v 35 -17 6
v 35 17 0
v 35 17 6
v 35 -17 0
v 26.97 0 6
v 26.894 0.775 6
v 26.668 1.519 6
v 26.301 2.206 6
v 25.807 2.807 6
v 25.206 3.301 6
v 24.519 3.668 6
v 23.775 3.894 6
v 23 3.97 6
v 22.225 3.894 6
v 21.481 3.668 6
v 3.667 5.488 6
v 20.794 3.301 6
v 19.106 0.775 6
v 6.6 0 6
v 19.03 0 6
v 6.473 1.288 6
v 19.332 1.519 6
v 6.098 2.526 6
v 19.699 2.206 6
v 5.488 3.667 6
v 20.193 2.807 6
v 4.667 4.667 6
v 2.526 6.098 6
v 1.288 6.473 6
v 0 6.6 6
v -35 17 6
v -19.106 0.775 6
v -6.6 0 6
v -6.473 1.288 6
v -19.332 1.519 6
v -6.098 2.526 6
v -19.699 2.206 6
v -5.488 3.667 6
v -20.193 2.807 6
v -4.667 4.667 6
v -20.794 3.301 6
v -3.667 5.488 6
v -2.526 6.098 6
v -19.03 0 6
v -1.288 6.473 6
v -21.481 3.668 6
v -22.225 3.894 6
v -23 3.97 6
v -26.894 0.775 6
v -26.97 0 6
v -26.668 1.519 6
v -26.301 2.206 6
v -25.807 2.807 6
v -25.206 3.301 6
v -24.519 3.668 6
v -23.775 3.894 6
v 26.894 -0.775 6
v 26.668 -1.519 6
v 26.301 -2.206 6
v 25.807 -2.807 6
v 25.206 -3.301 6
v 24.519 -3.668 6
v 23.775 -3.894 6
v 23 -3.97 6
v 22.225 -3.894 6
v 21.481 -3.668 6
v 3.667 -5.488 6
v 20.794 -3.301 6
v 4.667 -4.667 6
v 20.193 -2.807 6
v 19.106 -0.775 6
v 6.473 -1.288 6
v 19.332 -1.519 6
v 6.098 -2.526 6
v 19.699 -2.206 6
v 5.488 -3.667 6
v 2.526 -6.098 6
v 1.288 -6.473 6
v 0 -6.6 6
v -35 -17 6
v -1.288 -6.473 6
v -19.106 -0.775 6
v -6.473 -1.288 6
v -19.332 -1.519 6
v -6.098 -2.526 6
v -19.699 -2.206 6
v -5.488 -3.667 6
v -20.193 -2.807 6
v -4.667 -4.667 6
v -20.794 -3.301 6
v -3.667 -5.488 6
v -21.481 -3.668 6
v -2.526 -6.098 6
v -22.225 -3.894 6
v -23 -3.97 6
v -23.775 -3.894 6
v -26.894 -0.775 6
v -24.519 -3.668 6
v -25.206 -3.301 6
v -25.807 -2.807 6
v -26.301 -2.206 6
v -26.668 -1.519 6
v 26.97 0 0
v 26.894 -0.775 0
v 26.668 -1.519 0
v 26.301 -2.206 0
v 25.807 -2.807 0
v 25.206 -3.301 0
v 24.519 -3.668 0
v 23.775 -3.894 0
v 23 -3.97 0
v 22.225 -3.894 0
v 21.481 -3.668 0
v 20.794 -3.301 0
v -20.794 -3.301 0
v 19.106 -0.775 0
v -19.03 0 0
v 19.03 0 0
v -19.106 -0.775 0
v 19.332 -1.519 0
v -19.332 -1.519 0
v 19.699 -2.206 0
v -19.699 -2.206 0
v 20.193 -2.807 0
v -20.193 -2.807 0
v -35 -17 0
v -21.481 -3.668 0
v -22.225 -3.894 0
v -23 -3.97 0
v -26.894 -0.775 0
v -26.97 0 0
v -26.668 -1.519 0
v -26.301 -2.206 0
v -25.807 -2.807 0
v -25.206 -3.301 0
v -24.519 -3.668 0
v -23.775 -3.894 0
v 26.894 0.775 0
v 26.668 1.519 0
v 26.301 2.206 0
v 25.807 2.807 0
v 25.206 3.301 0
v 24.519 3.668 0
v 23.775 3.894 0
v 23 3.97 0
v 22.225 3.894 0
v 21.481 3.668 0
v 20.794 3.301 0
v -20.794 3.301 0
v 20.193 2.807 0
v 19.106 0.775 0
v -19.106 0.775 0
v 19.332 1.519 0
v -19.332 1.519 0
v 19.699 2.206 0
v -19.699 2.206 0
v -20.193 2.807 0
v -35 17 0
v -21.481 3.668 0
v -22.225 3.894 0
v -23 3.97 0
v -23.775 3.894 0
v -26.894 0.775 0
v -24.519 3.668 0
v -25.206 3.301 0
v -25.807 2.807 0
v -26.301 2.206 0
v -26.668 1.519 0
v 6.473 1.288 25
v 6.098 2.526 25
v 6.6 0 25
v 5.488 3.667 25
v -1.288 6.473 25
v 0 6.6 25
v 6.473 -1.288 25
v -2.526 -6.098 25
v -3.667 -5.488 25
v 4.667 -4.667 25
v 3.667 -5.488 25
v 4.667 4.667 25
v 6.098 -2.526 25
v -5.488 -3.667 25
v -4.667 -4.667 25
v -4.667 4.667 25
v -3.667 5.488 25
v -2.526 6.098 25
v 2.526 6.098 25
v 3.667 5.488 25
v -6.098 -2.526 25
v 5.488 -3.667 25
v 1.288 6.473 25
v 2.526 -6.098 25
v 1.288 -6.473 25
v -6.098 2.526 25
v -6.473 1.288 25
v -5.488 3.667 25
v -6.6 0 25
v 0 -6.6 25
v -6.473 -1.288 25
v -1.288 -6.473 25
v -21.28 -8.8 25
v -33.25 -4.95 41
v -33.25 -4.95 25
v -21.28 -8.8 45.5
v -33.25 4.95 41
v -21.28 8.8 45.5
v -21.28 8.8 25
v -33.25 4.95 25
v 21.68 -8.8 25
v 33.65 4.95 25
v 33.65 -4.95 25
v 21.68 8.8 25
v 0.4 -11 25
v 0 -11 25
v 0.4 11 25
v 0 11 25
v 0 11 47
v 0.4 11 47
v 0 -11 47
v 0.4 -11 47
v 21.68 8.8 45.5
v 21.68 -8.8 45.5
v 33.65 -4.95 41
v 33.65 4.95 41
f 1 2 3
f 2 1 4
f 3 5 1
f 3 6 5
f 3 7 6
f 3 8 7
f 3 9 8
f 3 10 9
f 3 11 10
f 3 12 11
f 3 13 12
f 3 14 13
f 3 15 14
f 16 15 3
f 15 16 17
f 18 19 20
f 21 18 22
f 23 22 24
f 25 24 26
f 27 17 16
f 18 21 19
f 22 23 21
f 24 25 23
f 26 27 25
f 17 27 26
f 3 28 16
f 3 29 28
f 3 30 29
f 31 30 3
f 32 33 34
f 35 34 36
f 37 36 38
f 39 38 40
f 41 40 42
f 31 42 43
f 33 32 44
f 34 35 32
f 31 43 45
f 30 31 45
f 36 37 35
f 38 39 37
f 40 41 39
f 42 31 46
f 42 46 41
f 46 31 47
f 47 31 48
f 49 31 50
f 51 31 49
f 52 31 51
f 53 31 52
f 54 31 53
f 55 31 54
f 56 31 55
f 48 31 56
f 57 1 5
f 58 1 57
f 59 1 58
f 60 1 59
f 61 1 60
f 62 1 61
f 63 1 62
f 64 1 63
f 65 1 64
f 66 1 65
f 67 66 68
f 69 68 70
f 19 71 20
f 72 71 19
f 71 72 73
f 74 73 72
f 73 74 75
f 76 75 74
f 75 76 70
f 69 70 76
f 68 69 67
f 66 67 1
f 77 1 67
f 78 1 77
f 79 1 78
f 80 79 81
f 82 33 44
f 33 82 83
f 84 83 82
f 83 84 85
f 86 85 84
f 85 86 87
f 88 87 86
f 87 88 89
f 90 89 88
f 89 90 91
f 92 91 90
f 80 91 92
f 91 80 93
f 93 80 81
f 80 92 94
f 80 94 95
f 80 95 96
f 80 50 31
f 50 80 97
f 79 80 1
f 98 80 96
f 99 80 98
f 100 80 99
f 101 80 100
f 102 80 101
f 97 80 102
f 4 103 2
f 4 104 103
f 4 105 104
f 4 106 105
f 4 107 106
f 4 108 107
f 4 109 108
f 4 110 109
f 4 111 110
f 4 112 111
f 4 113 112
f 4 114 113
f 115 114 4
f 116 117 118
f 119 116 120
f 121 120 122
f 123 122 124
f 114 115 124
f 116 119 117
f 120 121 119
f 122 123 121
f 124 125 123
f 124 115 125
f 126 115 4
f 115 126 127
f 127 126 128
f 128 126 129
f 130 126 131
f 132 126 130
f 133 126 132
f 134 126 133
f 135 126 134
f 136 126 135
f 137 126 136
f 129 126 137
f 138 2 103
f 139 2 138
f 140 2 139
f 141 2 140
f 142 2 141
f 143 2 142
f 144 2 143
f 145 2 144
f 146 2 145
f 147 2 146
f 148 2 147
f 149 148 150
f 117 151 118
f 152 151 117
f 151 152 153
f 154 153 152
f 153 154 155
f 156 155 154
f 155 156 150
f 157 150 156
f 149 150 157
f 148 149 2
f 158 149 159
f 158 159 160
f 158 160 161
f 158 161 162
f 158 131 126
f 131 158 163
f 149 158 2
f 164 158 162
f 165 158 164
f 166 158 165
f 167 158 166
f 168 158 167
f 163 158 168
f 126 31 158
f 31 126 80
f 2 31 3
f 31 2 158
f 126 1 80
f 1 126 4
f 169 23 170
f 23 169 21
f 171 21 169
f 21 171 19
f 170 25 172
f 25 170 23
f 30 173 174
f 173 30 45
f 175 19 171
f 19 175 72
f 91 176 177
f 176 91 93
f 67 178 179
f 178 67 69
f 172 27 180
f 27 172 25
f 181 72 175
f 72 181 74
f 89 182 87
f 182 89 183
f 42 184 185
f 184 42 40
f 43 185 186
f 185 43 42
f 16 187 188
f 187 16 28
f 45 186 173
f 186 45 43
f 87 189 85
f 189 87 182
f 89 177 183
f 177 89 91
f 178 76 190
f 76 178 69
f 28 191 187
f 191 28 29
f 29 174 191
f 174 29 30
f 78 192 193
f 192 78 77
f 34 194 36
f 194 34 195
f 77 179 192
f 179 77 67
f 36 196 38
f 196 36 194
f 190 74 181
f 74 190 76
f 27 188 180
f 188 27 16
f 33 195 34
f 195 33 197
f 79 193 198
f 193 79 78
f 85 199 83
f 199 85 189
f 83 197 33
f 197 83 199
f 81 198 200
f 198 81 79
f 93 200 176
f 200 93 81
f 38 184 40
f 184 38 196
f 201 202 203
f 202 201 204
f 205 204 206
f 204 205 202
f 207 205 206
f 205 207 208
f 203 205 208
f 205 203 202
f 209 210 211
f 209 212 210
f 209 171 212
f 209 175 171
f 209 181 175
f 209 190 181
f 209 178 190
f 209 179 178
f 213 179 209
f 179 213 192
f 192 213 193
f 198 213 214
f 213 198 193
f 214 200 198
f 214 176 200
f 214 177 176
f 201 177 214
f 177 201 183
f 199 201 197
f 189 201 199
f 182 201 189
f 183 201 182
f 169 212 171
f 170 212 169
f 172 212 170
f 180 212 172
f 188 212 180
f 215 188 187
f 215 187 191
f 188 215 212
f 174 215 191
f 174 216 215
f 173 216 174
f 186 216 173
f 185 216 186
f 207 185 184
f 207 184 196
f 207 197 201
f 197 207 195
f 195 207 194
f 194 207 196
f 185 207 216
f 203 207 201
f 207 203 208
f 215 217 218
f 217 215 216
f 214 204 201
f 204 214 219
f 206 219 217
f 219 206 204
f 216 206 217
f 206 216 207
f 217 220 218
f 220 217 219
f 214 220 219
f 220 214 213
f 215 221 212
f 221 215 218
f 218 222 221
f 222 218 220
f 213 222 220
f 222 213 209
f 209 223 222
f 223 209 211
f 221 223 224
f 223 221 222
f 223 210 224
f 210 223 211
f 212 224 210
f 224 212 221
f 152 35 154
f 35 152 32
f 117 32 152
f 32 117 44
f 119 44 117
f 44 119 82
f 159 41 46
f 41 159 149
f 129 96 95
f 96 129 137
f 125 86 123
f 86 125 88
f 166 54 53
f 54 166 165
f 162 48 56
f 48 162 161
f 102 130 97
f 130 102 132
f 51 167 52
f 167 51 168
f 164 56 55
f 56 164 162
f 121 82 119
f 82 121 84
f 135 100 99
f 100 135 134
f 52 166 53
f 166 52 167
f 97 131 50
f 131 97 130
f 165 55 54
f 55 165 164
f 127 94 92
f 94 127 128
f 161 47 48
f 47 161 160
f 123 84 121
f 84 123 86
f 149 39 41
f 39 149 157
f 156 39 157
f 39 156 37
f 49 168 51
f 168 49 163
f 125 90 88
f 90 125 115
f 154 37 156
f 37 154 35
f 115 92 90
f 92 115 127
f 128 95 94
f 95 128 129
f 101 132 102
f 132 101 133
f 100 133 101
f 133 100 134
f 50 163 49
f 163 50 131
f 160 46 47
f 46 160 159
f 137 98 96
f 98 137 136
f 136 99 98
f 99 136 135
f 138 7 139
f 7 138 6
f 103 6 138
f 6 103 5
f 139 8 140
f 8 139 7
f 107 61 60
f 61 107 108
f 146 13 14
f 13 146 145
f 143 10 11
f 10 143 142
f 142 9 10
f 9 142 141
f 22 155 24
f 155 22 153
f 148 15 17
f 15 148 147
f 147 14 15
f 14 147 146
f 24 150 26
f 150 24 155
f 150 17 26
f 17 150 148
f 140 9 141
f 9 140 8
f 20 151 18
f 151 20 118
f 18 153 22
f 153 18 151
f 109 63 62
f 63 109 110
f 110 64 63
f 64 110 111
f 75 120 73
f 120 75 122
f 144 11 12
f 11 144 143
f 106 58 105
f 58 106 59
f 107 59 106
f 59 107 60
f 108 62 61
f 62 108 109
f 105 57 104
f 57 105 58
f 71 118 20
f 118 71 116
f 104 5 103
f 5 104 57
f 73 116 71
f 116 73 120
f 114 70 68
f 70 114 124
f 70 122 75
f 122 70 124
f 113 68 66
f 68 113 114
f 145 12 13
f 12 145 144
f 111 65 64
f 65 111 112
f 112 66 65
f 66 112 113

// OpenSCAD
$fn = 32;

// ----------------------------------------------------------------------
// Boat cleat: 70 mm base, horn 36 mm up
// ----------------------------------------------------------------------

// --- parameters (mm) ---
base_l = 70;              // base length
base_w = 34;              // base width
base_t = 6;               // base thickness
horn_len = 66.5;          // horn length
horn_d = 22;              // horn diameter at the middle
horn_z = 36;              // horn axis height
end_drop = 6;             // how far the horn tips drop
post_d = 13.2;            // centre post diameter
holes_d = 7.94;           // fixing holes
hole_x = 23;              // fixing hole spacing

difference() {
  union() {
    translate([-35, -17, 0]) cube([base_l, base_w, base_t]);
    /* centre post, sunk 1 mm into the base */
    translate([0, 0, 5]) cylinder(h = 31, d = post_d);
    /* horn: a hull chain of boxes, full in the middle and lighter at the tips */
    hull() {
      translate([-33.25, -4.95, 25]) cube([0.4, 9.9, 16], center = false);
      translate([-21.28, -8.8, 25]) cube([0.4, 17.6, 20.5], center = false);
    }
    hull() {
      translate([-21.28, -8.8, 25]) cube([0.4, 17.6, 20.5], center = false);
      translate([0, -11, 25]) cube([0.4, 22, 22], center = false);
    }
    hull() {
      translate([0, -11, 25]) cube([0.4, 22, 22], center = false);
      translate([21.28, -8.8, 25]) cube([0.4, 17.6, 20.5], center = false);
    }
    hull() {
      translate([21.28, -8.8, 25]) cube([0.4, 17.6, 20.5], center = false);
      translate([33.25, -4.95, 25]) cube([0.4, 9.9, 16], center = false);
    }
  }
  translate([-23, 0, -2.5]) cylinder(h = base_t + 5, d = holes_d);
  translate([23, 0, -2.5]) cylinder(h = base_t + 5, d = holes_d);
}
